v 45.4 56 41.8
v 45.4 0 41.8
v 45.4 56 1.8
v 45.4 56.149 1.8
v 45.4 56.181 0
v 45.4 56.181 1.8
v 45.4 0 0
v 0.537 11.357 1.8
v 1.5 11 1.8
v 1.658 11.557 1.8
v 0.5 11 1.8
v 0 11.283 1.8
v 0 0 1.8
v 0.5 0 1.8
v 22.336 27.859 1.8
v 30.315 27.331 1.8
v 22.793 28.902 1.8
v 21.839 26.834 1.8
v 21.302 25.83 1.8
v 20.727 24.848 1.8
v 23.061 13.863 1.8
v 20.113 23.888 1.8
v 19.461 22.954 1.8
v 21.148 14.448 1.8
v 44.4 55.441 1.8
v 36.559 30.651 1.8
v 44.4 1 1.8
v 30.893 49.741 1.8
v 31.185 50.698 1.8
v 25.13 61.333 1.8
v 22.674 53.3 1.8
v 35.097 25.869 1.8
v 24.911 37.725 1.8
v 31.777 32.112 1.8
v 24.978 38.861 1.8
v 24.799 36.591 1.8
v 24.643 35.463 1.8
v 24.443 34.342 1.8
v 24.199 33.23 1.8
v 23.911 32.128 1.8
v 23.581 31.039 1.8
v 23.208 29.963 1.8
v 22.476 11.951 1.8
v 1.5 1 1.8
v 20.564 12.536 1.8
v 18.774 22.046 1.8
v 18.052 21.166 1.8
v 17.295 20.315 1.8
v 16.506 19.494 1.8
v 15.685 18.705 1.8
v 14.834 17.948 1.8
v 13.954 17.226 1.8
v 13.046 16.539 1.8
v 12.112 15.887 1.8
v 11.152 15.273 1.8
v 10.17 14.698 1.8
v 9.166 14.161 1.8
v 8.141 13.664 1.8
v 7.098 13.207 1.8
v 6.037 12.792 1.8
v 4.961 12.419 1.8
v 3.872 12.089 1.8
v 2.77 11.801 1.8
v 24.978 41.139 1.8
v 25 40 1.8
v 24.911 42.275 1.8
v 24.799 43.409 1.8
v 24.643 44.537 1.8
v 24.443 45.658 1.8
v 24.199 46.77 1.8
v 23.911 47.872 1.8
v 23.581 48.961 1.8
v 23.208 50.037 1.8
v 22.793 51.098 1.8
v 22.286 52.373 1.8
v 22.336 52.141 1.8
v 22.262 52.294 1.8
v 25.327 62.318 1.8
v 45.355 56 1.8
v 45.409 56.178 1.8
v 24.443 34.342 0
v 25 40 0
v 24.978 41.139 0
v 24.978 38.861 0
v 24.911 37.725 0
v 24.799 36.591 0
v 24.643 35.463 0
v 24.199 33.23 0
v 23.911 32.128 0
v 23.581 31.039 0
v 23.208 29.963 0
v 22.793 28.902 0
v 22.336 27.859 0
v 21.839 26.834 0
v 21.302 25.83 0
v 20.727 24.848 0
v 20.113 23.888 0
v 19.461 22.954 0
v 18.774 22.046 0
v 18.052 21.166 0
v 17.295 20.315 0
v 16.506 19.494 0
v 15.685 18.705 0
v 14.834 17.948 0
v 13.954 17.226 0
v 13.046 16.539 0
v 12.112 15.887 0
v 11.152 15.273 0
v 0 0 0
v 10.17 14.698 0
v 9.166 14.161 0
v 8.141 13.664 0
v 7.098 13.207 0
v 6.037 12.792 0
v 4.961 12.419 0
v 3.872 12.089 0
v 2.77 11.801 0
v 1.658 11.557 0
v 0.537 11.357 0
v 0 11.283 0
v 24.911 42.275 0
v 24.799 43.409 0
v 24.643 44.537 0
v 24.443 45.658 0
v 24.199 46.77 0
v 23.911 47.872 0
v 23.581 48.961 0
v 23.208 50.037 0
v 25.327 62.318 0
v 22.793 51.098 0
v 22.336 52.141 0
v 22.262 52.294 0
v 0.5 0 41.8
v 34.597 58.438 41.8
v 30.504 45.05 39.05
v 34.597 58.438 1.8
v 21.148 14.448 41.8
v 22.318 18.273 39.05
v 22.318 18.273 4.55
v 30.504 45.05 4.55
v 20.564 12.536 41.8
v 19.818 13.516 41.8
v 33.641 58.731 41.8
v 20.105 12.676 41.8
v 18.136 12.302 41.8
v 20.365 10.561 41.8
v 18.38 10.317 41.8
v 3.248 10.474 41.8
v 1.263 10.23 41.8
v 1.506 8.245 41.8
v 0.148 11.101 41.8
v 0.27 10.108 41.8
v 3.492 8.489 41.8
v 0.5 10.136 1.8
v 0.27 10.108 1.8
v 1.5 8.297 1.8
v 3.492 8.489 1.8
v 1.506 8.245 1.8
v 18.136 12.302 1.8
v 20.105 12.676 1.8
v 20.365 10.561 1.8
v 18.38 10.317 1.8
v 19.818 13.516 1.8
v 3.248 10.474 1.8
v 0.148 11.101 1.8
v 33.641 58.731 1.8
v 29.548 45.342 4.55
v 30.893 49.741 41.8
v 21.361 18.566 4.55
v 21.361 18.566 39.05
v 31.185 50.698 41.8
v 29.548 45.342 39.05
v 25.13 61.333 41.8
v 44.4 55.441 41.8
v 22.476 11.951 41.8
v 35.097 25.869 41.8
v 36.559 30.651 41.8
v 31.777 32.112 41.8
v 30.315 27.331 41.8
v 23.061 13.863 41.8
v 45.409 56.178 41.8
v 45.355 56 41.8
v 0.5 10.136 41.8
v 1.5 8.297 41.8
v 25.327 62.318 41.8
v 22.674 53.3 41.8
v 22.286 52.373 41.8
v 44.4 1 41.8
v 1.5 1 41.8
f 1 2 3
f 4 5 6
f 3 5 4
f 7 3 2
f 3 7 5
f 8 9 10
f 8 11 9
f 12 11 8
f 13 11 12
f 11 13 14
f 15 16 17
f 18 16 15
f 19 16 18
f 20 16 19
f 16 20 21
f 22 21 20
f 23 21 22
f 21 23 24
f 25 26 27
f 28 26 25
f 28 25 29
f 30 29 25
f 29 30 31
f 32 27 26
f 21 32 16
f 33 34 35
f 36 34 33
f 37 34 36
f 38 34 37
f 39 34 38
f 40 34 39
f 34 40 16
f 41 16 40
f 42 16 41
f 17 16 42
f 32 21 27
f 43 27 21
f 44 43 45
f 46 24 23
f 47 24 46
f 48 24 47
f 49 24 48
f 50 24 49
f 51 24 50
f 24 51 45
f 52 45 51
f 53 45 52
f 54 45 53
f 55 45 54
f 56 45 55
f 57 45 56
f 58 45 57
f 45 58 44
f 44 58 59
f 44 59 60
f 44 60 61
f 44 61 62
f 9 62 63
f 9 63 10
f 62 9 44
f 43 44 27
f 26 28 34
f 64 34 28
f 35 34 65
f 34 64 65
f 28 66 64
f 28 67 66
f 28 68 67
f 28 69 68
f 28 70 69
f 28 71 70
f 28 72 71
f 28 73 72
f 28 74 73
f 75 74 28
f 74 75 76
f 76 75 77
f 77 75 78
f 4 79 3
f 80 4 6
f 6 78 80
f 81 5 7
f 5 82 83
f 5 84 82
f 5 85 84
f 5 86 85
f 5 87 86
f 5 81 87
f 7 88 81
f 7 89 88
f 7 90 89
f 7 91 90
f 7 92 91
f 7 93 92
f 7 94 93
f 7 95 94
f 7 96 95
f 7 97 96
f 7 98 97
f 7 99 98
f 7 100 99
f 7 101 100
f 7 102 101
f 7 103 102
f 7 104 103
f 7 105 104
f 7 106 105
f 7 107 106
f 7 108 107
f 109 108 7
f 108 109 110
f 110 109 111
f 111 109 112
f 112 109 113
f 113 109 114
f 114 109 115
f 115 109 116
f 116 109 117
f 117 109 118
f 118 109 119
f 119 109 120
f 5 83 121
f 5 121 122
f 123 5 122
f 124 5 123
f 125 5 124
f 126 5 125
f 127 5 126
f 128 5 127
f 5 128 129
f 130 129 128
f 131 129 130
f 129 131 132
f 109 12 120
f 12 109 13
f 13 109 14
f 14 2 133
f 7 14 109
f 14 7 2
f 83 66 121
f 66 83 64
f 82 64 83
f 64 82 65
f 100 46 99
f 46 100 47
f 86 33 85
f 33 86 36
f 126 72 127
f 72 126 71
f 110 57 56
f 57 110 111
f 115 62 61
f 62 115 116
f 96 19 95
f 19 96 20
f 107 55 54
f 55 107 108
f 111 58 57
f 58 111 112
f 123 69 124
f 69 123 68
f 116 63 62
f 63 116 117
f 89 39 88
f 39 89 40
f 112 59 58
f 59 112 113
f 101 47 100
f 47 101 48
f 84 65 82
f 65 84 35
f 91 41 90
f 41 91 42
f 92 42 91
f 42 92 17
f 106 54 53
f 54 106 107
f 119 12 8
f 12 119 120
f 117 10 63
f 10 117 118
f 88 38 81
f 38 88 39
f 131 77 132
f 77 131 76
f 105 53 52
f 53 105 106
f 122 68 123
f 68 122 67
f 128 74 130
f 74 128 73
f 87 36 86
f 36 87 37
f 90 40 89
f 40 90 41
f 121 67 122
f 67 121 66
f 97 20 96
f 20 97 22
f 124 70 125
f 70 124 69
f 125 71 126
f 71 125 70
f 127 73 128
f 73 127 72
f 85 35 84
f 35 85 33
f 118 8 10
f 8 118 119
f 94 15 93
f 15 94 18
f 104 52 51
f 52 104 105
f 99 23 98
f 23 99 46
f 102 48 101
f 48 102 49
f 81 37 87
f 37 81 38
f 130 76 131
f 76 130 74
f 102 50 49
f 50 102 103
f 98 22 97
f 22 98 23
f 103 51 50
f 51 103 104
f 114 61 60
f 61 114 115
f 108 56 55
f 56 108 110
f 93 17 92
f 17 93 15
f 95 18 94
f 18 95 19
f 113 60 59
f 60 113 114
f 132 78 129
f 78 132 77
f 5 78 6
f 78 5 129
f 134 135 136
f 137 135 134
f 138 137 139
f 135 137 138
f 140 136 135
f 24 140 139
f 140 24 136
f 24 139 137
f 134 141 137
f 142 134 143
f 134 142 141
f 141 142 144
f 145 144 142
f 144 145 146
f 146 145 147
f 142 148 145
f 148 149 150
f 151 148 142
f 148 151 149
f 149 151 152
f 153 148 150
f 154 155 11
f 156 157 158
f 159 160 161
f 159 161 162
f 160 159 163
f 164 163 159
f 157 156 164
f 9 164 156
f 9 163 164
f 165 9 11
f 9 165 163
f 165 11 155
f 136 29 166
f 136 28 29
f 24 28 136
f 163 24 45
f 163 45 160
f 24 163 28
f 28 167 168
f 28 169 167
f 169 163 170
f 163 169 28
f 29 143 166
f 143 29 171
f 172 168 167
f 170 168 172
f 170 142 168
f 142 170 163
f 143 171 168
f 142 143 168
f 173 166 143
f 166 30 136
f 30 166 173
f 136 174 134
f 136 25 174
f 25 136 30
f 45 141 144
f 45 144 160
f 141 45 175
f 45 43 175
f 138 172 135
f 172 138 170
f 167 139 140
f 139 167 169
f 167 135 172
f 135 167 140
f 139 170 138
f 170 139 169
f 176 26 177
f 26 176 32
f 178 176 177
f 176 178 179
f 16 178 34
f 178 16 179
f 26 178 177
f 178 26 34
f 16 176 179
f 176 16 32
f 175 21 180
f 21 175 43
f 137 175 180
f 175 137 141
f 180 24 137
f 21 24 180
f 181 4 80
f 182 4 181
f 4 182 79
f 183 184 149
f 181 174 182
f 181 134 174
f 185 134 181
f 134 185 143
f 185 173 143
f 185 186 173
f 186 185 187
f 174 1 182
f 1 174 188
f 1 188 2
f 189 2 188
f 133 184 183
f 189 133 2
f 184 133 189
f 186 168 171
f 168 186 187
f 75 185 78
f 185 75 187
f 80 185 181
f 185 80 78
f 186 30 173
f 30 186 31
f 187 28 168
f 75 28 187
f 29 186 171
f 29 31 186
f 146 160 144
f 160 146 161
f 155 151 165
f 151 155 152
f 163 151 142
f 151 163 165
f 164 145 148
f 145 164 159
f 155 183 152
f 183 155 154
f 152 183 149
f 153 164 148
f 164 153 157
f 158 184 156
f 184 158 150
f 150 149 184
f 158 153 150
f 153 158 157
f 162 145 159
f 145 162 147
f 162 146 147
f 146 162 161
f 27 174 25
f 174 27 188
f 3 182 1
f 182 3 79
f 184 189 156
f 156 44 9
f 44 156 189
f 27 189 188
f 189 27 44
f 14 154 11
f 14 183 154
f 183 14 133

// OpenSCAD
$fn=160;
side_w = 1.8;   // width of side panels
w2 = 1;         // width of all other panels 10 mm

display_w = 34.5;
display_h = 28;
machine_w = 40;

module side()  {
    rad = 29;
    eps = 0.01;
    difference(){
        cube([ 45.4, 63.5, side_w]);
        translate([-4, rad + 11, -eps])
            cylinder(side_w + 2 * eps, rad, rad, [0, 0, 0]);
        rotate([0, 0, -17]) translate([-29, 30, -eps])
            cube([35, 80, side_w + 2 * eps]);
        rotate([0, 0, -17]) translate([-27, 67, -eps])
            cube([80, 20, side_w + 2 * eps]);
        }
}
module display_panel(){
    color("ForestGreen")
        difference(){
            cube([w2, 48, machine_w]);
            translate([-w2, 6, 0.5 * (machine_w - display_w)])
                cube([3 * w2, display_h, display_w]);
        }
    }

module top_cap(){
    color("DarkBlue")
        cube([21, w2, machine_w]);
}

module back_panel(){
    cube([w2, 56, machine_w]);
}

module marquee(){
    color("Purple", 0.4)
        cube([0.1, 10, machine_w]);
}

module marquee_bot(){
    color("Indigo")
        cube([10 - w2, w2, machine_w]);
}

module controls(){
    color("Aquamarine")
        cube([20, w2, machine_w]);
}

module bottom(){
    color("DimGray")
        cube([45 - w2 * 2, w2, machine_w]);
}

module front(){
    color("SkyBlue")
        cube([w2, 11, machine_w]);
}

color("Olive") {
    side();
   // translate([0,0,machine_w+side_w]) side();
}

rotate([0, 0, -17]){
    translate([15, 18, side_w])
        display_panel();

    // балки
    translate([21, 35, side_w])
        cube([5, 5, machine_w]);
    translate([15 + w2, 18, side_w])
        cube([2, 2, machine_w]);

    translate([6, 67 - w2, side_w])
        top_cap();

    translate([6, 56.6, side_w])
        marquee();
    translate([6, 56.6, side_w])
        marquee_bot();
}

translate([45.4 - w2, 0, side_w])
    back_panel();

rotate([0, 0, 7]) translate([1.5, 11 - w2, side_w]){
    controls();
    translate([1, -2, 0])
        cube([2, 2, machine_w]);
    translate([18, -2, 0])
        cube([2, 2, machine_w]);
}

translate([w2+0.5,0,side_w])
    bottom();

translate([0.5,0,side_w])
    front();
